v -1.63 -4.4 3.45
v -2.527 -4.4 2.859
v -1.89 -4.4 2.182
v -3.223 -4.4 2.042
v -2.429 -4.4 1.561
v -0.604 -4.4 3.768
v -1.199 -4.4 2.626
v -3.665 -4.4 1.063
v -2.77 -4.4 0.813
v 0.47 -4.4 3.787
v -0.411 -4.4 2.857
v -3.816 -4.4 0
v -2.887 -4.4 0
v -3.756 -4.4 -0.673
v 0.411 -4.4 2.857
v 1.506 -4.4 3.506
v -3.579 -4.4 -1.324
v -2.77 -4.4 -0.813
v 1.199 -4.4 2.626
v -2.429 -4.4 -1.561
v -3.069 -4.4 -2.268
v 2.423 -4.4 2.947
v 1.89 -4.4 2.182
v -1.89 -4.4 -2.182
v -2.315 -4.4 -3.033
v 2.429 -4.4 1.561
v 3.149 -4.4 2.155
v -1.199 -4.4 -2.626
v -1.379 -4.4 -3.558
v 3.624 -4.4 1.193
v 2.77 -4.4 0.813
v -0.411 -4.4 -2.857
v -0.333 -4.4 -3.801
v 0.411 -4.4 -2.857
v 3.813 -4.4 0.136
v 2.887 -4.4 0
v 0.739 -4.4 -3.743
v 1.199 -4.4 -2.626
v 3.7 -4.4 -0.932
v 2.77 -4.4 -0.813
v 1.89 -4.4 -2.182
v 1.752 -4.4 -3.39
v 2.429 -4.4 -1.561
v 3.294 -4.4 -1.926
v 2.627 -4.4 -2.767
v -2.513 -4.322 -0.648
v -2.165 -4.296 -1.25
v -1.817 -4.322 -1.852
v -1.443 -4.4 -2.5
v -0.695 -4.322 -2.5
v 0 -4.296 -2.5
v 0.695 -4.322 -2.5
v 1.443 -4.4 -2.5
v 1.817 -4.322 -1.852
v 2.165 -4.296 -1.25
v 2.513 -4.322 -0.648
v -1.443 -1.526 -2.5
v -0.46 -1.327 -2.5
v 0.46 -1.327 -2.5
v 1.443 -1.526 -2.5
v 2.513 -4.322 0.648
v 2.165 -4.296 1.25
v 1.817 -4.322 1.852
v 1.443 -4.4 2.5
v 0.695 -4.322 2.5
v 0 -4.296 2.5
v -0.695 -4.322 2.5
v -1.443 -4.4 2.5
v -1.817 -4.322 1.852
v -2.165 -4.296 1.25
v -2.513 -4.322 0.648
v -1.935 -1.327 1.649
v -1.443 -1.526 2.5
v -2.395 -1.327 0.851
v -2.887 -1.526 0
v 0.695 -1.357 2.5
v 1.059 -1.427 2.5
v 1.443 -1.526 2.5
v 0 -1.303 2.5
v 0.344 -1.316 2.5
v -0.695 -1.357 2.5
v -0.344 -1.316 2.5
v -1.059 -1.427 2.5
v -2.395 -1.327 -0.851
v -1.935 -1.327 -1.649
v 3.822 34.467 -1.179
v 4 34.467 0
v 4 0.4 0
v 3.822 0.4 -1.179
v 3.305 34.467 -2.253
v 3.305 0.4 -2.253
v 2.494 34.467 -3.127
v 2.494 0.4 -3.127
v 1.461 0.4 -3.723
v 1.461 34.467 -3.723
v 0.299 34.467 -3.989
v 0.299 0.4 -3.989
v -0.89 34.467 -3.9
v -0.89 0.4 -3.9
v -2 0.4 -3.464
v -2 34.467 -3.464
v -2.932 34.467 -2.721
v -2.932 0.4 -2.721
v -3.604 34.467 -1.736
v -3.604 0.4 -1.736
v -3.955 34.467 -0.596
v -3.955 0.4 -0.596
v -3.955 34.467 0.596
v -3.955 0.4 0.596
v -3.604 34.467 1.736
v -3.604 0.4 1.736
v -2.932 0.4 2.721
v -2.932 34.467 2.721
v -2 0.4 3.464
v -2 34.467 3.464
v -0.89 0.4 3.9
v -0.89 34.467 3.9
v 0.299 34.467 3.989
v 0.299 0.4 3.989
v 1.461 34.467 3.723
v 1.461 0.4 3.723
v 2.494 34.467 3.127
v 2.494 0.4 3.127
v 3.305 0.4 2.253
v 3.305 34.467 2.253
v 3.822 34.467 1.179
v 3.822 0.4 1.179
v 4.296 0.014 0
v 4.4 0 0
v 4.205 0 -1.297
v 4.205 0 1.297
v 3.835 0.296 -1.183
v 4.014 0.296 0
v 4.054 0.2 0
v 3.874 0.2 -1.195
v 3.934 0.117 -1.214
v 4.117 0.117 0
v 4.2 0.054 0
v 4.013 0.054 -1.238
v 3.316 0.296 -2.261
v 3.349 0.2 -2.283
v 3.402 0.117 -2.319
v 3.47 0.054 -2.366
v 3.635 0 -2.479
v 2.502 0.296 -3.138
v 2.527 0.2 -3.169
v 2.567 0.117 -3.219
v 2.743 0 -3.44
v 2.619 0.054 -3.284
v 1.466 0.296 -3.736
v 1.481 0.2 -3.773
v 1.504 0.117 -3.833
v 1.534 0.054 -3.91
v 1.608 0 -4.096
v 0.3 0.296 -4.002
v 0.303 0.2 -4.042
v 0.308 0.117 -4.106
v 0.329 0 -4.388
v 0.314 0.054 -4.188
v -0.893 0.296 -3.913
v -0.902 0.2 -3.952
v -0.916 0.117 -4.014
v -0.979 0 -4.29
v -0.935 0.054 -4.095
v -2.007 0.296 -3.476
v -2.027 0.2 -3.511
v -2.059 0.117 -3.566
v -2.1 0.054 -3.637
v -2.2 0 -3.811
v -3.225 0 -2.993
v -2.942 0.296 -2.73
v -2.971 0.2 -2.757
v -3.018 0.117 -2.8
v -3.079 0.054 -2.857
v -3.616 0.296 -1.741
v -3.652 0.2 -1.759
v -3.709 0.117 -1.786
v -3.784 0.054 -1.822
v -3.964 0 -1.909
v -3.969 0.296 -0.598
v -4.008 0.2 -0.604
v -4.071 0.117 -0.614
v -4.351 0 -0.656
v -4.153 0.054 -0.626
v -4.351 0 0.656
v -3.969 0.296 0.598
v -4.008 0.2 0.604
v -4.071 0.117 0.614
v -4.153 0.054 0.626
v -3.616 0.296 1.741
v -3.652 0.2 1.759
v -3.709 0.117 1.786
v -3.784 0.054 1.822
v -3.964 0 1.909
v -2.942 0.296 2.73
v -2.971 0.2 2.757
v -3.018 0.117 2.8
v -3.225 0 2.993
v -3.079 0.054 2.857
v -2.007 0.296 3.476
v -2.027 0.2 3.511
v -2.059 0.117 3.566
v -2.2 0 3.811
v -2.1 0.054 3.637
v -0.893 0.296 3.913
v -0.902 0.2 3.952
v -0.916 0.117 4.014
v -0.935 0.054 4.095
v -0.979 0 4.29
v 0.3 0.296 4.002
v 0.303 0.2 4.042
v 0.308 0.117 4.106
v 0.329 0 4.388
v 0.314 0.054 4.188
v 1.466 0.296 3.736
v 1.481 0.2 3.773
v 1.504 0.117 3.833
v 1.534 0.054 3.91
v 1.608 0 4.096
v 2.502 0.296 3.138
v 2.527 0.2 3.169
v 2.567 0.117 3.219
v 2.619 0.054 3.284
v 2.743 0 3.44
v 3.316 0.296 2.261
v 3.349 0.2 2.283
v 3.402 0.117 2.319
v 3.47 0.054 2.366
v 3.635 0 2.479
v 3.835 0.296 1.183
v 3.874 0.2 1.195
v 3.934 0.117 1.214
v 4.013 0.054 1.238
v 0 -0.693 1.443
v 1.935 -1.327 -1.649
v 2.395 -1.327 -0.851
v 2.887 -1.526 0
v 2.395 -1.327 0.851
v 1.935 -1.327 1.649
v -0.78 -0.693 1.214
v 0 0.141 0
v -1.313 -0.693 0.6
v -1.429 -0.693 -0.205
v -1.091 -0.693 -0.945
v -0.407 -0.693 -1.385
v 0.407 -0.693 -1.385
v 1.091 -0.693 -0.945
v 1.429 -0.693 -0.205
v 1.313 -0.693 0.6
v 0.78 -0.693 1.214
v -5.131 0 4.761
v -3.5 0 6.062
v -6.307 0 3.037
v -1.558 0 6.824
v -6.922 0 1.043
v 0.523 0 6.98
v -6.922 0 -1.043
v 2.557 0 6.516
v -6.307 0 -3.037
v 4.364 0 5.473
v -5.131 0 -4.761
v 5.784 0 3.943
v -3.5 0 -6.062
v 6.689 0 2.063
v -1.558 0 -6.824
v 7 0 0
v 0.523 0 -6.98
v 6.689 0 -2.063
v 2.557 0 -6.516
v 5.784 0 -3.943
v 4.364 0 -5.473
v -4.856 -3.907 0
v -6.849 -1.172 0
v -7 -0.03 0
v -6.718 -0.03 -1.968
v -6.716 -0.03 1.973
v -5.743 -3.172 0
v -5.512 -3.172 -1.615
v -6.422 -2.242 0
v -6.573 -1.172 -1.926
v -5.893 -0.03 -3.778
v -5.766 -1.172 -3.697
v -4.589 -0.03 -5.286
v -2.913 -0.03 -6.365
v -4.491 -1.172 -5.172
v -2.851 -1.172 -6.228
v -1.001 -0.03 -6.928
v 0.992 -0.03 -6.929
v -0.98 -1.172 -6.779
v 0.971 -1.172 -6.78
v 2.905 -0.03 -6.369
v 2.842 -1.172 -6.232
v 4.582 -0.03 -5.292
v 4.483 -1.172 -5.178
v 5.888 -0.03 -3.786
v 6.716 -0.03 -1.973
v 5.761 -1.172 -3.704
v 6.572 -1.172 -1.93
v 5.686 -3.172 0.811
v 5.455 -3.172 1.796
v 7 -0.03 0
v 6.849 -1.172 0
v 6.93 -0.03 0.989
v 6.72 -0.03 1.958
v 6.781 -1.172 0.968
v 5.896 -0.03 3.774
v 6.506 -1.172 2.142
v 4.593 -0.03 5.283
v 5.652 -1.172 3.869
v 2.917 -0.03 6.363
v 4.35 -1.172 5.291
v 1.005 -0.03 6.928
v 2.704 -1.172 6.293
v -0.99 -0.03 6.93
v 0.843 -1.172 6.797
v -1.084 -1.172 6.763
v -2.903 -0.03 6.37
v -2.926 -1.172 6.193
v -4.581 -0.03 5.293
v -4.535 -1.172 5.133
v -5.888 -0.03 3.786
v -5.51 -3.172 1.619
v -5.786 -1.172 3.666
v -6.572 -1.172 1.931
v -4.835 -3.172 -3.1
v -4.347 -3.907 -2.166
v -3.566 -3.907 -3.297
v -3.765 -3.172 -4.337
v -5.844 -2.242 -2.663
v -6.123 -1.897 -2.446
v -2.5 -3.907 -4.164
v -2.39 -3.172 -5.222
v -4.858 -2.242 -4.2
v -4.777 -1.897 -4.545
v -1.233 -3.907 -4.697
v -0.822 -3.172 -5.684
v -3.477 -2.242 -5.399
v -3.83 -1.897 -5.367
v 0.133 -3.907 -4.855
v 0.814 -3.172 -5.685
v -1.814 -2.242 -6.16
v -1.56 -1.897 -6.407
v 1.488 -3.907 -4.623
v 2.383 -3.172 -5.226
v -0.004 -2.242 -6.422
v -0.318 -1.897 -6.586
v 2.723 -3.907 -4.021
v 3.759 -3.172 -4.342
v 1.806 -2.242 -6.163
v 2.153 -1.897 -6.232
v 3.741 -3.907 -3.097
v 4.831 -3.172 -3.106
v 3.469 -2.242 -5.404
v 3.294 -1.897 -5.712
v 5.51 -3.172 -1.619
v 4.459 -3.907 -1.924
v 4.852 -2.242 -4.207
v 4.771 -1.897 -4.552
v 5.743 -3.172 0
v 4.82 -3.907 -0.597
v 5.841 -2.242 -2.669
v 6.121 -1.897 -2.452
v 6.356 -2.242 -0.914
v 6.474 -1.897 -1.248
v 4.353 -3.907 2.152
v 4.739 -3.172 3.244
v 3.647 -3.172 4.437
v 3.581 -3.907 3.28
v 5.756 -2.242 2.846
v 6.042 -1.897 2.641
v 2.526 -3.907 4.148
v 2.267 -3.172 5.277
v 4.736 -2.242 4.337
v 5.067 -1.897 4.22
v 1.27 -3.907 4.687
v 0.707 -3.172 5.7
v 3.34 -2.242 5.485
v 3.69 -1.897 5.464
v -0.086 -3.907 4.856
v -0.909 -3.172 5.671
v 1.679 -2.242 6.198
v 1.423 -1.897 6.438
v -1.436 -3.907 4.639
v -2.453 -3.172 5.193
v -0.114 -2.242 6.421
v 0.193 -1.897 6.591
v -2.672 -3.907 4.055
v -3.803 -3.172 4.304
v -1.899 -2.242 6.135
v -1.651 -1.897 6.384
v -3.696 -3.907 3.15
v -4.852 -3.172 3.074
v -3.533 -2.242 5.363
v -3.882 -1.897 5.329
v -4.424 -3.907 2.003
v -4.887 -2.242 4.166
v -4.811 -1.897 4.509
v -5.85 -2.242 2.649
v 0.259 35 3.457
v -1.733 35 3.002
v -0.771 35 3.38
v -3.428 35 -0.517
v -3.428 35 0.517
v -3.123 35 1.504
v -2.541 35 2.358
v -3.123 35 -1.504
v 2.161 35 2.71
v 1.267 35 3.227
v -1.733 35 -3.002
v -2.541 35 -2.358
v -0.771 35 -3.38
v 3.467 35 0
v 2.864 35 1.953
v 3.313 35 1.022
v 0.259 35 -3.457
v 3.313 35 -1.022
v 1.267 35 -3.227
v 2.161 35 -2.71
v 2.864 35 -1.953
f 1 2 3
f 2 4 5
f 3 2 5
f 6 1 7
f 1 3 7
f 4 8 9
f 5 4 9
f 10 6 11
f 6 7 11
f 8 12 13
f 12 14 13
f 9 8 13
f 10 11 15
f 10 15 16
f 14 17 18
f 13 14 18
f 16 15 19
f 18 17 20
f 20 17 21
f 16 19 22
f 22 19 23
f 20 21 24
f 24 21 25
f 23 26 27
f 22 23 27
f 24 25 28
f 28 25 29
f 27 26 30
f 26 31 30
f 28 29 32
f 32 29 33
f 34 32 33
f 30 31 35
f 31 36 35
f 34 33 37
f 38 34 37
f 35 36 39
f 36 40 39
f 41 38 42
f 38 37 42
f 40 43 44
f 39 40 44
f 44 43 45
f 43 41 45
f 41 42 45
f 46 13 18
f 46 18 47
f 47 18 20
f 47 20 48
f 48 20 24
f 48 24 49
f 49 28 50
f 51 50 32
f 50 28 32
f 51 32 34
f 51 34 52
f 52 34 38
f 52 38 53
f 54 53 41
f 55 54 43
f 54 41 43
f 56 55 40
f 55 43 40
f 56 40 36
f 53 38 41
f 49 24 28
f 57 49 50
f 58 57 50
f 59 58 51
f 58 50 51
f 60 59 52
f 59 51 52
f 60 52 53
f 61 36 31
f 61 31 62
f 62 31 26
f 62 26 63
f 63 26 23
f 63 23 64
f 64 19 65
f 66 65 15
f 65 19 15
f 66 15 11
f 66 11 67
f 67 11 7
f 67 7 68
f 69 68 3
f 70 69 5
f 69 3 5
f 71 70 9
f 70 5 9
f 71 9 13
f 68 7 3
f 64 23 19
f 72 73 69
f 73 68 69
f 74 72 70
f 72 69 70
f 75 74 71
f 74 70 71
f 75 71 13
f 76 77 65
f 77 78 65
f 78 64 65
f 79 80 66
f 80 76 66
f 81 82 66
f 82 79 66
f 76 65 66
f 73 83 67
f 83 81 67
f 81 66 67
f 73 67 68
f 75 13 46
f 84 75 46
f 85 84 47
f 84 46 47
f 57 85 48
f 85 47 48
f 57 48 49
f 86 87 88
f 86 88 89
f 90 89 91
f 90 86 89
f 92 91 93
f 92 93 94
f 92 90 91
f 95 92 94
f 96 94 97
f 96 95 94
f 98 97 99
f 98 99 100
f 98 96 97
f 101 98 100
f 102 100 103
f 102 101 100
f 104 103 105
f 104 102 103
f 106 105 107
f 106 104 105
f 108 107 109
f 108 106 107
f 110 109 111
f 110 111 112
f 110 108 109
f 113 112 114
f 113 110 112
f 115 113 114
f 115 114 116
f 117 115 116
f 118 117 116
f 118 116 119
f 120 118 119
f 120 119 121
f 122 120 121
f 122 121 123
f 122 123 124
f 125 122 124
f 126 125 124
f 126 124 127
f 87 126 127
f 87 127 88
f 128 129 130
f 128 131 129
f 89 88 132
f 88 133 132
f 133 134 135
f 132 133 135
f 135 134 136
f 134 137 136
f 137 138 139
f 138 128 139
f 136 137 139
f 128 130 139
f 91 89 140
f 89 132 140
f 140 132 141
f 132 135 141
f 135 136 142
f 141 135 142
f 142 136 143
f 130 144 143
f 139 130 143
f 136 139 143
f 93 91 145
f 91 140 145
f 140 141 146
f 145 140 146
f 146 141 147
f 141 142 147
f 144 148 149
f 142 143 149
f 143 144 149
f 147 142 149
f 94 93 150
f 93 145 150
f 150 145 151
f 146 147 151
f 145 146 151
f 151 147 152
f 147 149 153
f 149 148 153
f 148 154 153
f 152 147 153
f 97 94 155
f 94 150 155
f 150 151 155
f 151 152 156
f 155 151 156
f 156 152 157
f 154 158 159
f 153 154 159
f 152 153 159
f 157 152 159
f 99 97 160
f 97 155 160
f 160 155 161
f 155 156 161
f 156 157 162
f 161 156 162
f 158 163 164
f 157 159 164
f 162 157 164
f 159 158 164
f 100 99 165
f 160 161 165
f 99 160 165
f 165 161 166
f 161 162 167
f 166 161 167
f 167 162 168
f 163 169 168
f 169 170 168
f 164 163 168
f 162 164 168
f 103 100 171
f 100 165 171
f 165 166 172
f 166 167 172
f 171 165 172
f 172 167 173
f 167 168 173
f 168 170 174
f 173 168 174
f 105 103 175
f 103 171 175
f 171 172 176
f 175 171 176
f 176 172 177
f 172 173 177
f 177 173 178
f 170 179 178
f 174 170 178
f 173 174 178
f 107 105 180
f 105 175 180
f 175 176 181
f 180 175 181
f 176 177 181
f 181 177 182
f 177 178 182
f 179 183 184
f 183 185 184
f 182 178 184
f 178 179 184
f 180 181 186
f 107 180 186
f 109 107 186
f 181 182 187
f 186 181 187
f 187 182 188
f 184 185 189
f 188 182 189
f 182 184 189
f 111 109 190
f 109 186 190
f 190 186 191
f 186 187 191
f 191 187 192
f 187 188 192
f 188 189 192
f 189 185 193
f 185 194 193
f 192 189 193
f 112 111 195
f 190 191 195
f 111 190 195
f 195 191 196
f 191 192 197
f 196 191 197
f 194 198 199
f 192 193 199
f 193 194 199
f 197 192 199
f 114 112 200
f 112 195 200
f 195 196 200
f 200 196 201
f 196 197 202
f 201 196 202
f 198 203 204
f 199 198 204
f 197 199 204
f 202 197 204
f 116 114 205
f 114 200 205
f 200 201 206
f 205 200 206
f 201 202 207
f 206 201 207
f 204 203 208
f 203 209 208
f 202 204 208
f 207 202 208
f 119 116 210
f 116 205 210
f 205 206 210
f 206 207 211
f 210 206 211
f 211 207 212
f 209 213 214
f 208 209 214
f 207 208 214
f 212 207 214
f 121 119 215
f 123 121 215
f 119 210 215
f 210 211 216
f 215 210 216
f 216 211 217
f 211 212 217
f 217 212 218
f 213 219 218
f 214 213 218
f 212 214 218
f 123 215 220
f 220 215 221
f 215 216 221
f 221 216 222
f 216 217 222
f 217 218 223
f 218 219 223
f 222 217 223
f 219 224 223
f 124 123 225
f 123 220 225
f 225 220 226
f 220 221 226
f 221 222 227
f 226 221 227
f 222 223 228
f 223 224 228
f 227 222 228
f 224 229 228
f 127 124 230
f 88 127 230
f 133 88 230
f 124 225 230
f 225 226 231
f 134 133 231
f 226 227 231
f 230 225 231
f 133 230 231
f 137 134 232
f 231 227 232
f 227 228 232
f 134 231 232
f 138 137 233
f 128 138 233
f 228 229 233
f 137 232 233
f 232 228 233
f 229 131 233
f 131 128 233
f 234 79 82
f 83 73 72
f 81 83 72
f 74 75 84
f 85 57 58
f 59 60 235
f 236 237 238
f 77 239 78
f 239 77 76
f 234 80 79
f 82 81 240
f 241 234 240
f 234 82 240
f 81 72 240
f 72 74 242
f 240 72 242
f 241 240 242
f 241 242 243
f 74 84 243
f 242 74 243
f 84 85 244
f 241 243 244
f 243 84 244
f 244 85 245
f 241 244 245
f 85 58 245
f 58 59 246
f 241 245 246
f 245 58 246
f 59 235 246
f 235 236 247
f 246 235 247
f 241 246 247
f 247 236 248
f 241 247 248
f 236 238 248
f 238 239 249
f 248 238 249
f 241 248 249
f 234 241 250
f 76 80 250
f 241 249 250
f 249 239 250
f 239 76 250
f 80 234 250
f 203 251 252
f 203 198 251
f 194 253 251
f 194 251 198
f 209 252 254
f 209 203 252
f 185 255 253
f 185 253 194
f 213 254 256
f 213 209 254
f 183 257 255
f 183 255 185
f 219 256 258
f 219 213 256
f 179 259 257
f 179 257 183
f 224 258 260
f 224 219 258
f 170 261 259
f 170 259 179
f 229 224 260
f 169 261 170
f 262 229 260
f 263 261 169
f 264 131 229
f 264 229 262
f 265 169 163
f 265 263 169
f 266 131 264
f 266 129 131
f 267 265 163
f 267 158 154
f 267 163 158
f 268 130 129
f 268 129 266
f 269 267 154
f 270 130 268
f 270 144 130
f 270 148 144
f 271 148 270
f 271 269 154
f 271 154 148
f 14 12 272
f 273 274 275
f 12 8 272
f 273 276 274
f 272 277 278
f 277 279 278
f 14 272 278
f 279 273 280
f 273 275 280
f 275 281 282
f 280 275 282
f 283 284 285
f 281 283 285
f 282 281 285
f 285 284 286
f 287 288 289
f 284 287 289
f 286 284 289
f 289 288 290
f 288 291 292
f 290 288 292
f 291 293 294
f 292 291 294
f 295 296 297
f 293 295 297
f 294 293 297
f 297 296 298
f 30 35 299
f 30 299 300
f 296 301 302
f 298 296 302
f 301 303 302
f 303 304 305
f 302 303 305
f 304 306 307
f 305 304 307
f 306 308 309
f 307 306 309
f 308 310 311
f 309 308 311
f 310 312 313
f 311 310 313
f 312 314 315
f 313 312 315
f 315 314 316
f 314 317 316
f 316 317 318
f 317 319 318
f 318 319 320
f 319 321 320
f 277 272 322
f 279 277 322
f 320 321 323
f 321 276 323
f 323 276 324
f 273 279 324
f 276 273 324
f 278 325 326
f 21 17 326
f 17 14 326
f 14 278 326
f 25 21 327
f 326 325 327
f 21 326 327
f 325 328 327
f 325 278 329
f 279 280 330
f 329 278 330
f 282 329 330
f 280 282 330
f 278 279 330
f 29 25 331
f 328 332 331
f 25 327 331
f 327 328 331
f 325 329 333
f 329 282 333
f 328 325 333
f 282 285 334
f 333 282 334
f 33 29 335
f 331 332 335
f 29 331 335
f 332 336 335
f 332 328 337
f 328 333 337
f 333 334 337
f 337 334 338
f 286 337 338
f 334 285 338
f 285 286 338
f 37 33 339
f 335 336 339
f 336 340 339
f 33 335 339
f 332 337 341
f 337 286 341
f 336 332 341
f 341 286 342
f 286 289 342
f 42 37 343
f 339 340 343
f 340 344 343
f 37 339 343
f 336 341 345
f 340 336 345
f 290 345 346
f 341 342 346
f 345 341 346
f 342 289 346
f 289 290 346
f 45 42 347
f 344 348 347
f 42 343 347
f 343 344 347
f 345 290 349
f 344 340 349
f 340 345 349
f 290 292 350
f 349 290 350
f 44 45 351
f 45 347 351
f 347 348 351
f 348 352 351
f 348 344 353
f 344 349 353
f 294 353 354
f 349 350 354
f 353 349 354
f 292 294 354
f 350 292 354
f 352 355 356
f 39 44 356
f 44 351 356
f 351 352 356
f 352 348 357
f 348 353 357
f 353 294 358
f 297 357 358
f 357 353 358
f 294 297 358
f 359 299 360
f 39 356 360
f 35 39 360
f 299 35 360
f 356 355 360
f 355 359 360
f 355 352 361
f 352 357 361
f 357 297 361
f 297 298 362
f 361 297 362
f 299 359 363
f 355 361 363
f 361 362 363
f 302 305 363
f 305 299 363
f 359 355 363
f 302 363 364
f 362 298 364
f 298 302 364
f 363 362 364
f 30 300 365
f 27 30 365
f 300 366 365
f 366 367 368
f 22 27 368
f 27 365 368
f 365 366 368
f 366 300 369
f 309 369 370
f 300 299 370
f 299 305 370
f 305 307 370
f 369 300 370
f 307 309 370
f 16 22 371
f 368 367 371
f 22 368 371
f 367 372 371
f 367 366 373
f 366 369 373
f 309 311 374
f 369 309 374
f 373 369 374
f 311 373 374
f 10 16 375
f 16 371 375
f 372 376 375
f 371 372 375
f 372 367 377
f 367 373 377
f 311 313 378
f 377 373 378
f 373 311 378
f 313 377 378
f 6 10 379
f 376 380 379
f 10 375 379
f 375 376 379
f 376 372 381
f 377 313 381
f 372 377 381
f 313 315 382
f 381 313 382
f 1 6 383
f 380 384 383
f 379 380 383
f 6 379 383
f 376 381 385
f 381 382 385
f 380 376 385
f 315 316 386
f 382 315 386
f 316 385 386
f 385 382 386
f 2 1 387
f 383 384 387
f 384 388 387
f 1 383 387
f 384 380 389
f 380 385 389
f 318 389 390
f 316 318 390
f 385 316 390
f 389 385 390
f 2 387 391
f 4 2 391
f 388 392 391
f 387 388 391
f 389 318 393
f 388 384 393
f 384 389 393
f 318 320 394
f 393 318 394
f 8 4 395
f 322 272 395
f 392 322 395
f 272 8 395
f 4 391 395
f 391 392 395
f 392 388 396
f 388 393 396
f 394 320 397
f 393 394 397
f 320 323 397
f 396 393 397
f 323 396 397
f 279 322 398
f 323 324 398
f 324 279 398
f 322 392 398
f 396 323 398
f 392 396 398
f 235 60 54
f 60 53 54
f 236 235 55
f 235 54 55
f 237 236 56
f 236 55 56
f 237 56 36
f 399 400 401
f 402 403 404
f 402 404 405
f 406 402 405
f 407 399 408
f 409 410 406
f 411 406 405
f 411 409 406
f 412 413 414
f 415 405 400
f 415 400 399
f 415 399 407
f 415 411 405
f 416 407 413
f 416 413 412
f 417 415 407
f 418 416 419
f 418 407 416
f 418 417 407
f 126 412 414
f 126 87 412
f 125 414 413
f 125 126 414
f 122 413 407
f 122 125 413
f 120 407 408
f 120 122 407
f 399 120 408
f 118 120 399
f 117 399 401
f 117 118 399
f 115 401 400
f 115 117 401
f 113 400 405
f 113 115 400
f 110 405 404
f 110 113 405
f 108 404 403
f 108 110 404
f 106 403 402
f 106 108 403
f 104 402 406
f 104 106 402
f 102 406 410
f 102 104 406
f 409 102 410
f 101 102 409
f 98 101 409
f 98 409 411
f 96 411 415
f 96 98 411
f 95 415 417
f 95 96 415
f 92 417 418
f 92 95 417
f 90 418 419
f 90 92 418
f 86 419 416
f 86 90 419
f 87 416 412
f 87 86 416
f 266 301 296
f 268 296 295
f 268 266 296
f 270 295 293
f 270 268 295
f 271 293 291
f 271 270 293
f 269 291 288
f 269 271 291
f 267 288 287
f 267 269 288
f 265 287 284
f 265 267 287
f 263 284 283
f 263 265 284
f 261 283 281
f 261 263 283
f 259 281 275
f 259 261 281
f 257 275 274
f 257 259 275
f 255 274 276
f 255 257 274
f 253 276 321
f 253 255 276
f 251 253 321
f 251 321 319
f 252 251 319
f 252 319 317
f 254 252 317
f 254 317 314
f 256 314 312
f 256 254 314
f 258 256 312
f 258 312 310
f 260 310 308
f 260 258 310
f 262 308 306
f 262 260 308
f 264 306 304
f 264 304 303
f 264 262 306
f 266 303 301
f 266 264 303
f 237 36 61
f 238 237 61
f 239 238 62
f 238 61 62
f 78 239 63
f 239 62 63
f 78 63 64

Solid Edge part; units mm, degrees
sketch "Sketch1" plane through (0, 0, 0) normal (0, 0, 1) x (1, 0, 0)
  line L0 (4, 0) -> (4, 35)
  line L1 (0, 35) -> (4, 35)
  line L2 (0, 0) -> (0, 35)
  line L3 (0, 0) -> (0, -4.4)
  line L4 (0, -4.4) -> (7, -4.4)
  line L5 (7, -4.4) -> (7, 0)
  line L6 (7, 0) -> (4, 0)
revolve "RevolvedProtrusion1" add sketch "Sketch1" angle 360 about axis through (0, 0, 0) along (0, 1, 0)
sketch "Sketch2" plane through (0, 0, 0) normal (1, 0, 0) x (0, 1, 0)
  line L0 (-4.4, 3.3615) -> (-1.8, 3.3615)
  line L1 (0.1408, 0) -> (-1.8, 3.3615)
  line L2 (-4.4, 0) -> (0.1408, 0)
  line L3 (-4.4, 0) -> (-4.4, 3.3615)
revolve "RevolvedCutout1" cut sketch "Sketch2" angle 360 about axis through (0, -4.5, 0) along (0, 1, 0)
sketch "Sketch3" plane through (0, -4.4, 0) normal (0, -1, 0) x (0, 0, 1)
  circle A0 centre (0, 0) radius 3.3615
  line L0 (-2.5, -1.4434) -> (0, -2.8868)
  line L1 (0, -2.8868) -> (2.5, -1.4434)
  line L2 (2.5, -1.4434) -> (2.5, 1.4434)
  line L3 (2.5, 1.4434) -> (0, 2.8868)
  line L4 (0, 2.8868) -> (-2.5, 1.4434)
  line L5 (-2.5, 1.4434) -> (-2.5, -1.4434)
  dimension "D1" = 5
extrude "Protrusion1" add sketch "Sketch3" against normal up to next
sketch "Sketch4" plane through (0, 0, 0) normal (0, 0, 1) x (1, 0, 0)
  line L0 (-2.8868, -4.4) -> (0, -4.4)
  line L1 (0, -4.4) -> (0, -3.6265)
  line L2 (0, -3.6265) -> (-2.8868, -4.4)
revolve "RevolvedCutout2" cut sketch "Sketch4" angle 360 about axis through (0, -4.5, 0) along (0, 1, 0)
fillet "Round1" radius 0.4 1 edges at (0, 0, -4)
chamfer "倒斜角_2" distance 0.5333 angle 45 1 edges at (0, 35, -4)
cosmetic_thread "螺纹_3" size "M8" thread depth 32.5
sketch "Sketch5" plane through (0, 0, 0) normal (0, 0, 1) x (1, 0, 0)
  arc A0 (-3.8153, -4.4) -> (-7, 0) centre (-2.3681, 0) cw
revolve "RevolvedCutout3" cut sketch "Sketch5" angle 360 about axis through (0, 0, 0) along (0, -1, 0) material side at (-6.1609, -2.7452, 0)
